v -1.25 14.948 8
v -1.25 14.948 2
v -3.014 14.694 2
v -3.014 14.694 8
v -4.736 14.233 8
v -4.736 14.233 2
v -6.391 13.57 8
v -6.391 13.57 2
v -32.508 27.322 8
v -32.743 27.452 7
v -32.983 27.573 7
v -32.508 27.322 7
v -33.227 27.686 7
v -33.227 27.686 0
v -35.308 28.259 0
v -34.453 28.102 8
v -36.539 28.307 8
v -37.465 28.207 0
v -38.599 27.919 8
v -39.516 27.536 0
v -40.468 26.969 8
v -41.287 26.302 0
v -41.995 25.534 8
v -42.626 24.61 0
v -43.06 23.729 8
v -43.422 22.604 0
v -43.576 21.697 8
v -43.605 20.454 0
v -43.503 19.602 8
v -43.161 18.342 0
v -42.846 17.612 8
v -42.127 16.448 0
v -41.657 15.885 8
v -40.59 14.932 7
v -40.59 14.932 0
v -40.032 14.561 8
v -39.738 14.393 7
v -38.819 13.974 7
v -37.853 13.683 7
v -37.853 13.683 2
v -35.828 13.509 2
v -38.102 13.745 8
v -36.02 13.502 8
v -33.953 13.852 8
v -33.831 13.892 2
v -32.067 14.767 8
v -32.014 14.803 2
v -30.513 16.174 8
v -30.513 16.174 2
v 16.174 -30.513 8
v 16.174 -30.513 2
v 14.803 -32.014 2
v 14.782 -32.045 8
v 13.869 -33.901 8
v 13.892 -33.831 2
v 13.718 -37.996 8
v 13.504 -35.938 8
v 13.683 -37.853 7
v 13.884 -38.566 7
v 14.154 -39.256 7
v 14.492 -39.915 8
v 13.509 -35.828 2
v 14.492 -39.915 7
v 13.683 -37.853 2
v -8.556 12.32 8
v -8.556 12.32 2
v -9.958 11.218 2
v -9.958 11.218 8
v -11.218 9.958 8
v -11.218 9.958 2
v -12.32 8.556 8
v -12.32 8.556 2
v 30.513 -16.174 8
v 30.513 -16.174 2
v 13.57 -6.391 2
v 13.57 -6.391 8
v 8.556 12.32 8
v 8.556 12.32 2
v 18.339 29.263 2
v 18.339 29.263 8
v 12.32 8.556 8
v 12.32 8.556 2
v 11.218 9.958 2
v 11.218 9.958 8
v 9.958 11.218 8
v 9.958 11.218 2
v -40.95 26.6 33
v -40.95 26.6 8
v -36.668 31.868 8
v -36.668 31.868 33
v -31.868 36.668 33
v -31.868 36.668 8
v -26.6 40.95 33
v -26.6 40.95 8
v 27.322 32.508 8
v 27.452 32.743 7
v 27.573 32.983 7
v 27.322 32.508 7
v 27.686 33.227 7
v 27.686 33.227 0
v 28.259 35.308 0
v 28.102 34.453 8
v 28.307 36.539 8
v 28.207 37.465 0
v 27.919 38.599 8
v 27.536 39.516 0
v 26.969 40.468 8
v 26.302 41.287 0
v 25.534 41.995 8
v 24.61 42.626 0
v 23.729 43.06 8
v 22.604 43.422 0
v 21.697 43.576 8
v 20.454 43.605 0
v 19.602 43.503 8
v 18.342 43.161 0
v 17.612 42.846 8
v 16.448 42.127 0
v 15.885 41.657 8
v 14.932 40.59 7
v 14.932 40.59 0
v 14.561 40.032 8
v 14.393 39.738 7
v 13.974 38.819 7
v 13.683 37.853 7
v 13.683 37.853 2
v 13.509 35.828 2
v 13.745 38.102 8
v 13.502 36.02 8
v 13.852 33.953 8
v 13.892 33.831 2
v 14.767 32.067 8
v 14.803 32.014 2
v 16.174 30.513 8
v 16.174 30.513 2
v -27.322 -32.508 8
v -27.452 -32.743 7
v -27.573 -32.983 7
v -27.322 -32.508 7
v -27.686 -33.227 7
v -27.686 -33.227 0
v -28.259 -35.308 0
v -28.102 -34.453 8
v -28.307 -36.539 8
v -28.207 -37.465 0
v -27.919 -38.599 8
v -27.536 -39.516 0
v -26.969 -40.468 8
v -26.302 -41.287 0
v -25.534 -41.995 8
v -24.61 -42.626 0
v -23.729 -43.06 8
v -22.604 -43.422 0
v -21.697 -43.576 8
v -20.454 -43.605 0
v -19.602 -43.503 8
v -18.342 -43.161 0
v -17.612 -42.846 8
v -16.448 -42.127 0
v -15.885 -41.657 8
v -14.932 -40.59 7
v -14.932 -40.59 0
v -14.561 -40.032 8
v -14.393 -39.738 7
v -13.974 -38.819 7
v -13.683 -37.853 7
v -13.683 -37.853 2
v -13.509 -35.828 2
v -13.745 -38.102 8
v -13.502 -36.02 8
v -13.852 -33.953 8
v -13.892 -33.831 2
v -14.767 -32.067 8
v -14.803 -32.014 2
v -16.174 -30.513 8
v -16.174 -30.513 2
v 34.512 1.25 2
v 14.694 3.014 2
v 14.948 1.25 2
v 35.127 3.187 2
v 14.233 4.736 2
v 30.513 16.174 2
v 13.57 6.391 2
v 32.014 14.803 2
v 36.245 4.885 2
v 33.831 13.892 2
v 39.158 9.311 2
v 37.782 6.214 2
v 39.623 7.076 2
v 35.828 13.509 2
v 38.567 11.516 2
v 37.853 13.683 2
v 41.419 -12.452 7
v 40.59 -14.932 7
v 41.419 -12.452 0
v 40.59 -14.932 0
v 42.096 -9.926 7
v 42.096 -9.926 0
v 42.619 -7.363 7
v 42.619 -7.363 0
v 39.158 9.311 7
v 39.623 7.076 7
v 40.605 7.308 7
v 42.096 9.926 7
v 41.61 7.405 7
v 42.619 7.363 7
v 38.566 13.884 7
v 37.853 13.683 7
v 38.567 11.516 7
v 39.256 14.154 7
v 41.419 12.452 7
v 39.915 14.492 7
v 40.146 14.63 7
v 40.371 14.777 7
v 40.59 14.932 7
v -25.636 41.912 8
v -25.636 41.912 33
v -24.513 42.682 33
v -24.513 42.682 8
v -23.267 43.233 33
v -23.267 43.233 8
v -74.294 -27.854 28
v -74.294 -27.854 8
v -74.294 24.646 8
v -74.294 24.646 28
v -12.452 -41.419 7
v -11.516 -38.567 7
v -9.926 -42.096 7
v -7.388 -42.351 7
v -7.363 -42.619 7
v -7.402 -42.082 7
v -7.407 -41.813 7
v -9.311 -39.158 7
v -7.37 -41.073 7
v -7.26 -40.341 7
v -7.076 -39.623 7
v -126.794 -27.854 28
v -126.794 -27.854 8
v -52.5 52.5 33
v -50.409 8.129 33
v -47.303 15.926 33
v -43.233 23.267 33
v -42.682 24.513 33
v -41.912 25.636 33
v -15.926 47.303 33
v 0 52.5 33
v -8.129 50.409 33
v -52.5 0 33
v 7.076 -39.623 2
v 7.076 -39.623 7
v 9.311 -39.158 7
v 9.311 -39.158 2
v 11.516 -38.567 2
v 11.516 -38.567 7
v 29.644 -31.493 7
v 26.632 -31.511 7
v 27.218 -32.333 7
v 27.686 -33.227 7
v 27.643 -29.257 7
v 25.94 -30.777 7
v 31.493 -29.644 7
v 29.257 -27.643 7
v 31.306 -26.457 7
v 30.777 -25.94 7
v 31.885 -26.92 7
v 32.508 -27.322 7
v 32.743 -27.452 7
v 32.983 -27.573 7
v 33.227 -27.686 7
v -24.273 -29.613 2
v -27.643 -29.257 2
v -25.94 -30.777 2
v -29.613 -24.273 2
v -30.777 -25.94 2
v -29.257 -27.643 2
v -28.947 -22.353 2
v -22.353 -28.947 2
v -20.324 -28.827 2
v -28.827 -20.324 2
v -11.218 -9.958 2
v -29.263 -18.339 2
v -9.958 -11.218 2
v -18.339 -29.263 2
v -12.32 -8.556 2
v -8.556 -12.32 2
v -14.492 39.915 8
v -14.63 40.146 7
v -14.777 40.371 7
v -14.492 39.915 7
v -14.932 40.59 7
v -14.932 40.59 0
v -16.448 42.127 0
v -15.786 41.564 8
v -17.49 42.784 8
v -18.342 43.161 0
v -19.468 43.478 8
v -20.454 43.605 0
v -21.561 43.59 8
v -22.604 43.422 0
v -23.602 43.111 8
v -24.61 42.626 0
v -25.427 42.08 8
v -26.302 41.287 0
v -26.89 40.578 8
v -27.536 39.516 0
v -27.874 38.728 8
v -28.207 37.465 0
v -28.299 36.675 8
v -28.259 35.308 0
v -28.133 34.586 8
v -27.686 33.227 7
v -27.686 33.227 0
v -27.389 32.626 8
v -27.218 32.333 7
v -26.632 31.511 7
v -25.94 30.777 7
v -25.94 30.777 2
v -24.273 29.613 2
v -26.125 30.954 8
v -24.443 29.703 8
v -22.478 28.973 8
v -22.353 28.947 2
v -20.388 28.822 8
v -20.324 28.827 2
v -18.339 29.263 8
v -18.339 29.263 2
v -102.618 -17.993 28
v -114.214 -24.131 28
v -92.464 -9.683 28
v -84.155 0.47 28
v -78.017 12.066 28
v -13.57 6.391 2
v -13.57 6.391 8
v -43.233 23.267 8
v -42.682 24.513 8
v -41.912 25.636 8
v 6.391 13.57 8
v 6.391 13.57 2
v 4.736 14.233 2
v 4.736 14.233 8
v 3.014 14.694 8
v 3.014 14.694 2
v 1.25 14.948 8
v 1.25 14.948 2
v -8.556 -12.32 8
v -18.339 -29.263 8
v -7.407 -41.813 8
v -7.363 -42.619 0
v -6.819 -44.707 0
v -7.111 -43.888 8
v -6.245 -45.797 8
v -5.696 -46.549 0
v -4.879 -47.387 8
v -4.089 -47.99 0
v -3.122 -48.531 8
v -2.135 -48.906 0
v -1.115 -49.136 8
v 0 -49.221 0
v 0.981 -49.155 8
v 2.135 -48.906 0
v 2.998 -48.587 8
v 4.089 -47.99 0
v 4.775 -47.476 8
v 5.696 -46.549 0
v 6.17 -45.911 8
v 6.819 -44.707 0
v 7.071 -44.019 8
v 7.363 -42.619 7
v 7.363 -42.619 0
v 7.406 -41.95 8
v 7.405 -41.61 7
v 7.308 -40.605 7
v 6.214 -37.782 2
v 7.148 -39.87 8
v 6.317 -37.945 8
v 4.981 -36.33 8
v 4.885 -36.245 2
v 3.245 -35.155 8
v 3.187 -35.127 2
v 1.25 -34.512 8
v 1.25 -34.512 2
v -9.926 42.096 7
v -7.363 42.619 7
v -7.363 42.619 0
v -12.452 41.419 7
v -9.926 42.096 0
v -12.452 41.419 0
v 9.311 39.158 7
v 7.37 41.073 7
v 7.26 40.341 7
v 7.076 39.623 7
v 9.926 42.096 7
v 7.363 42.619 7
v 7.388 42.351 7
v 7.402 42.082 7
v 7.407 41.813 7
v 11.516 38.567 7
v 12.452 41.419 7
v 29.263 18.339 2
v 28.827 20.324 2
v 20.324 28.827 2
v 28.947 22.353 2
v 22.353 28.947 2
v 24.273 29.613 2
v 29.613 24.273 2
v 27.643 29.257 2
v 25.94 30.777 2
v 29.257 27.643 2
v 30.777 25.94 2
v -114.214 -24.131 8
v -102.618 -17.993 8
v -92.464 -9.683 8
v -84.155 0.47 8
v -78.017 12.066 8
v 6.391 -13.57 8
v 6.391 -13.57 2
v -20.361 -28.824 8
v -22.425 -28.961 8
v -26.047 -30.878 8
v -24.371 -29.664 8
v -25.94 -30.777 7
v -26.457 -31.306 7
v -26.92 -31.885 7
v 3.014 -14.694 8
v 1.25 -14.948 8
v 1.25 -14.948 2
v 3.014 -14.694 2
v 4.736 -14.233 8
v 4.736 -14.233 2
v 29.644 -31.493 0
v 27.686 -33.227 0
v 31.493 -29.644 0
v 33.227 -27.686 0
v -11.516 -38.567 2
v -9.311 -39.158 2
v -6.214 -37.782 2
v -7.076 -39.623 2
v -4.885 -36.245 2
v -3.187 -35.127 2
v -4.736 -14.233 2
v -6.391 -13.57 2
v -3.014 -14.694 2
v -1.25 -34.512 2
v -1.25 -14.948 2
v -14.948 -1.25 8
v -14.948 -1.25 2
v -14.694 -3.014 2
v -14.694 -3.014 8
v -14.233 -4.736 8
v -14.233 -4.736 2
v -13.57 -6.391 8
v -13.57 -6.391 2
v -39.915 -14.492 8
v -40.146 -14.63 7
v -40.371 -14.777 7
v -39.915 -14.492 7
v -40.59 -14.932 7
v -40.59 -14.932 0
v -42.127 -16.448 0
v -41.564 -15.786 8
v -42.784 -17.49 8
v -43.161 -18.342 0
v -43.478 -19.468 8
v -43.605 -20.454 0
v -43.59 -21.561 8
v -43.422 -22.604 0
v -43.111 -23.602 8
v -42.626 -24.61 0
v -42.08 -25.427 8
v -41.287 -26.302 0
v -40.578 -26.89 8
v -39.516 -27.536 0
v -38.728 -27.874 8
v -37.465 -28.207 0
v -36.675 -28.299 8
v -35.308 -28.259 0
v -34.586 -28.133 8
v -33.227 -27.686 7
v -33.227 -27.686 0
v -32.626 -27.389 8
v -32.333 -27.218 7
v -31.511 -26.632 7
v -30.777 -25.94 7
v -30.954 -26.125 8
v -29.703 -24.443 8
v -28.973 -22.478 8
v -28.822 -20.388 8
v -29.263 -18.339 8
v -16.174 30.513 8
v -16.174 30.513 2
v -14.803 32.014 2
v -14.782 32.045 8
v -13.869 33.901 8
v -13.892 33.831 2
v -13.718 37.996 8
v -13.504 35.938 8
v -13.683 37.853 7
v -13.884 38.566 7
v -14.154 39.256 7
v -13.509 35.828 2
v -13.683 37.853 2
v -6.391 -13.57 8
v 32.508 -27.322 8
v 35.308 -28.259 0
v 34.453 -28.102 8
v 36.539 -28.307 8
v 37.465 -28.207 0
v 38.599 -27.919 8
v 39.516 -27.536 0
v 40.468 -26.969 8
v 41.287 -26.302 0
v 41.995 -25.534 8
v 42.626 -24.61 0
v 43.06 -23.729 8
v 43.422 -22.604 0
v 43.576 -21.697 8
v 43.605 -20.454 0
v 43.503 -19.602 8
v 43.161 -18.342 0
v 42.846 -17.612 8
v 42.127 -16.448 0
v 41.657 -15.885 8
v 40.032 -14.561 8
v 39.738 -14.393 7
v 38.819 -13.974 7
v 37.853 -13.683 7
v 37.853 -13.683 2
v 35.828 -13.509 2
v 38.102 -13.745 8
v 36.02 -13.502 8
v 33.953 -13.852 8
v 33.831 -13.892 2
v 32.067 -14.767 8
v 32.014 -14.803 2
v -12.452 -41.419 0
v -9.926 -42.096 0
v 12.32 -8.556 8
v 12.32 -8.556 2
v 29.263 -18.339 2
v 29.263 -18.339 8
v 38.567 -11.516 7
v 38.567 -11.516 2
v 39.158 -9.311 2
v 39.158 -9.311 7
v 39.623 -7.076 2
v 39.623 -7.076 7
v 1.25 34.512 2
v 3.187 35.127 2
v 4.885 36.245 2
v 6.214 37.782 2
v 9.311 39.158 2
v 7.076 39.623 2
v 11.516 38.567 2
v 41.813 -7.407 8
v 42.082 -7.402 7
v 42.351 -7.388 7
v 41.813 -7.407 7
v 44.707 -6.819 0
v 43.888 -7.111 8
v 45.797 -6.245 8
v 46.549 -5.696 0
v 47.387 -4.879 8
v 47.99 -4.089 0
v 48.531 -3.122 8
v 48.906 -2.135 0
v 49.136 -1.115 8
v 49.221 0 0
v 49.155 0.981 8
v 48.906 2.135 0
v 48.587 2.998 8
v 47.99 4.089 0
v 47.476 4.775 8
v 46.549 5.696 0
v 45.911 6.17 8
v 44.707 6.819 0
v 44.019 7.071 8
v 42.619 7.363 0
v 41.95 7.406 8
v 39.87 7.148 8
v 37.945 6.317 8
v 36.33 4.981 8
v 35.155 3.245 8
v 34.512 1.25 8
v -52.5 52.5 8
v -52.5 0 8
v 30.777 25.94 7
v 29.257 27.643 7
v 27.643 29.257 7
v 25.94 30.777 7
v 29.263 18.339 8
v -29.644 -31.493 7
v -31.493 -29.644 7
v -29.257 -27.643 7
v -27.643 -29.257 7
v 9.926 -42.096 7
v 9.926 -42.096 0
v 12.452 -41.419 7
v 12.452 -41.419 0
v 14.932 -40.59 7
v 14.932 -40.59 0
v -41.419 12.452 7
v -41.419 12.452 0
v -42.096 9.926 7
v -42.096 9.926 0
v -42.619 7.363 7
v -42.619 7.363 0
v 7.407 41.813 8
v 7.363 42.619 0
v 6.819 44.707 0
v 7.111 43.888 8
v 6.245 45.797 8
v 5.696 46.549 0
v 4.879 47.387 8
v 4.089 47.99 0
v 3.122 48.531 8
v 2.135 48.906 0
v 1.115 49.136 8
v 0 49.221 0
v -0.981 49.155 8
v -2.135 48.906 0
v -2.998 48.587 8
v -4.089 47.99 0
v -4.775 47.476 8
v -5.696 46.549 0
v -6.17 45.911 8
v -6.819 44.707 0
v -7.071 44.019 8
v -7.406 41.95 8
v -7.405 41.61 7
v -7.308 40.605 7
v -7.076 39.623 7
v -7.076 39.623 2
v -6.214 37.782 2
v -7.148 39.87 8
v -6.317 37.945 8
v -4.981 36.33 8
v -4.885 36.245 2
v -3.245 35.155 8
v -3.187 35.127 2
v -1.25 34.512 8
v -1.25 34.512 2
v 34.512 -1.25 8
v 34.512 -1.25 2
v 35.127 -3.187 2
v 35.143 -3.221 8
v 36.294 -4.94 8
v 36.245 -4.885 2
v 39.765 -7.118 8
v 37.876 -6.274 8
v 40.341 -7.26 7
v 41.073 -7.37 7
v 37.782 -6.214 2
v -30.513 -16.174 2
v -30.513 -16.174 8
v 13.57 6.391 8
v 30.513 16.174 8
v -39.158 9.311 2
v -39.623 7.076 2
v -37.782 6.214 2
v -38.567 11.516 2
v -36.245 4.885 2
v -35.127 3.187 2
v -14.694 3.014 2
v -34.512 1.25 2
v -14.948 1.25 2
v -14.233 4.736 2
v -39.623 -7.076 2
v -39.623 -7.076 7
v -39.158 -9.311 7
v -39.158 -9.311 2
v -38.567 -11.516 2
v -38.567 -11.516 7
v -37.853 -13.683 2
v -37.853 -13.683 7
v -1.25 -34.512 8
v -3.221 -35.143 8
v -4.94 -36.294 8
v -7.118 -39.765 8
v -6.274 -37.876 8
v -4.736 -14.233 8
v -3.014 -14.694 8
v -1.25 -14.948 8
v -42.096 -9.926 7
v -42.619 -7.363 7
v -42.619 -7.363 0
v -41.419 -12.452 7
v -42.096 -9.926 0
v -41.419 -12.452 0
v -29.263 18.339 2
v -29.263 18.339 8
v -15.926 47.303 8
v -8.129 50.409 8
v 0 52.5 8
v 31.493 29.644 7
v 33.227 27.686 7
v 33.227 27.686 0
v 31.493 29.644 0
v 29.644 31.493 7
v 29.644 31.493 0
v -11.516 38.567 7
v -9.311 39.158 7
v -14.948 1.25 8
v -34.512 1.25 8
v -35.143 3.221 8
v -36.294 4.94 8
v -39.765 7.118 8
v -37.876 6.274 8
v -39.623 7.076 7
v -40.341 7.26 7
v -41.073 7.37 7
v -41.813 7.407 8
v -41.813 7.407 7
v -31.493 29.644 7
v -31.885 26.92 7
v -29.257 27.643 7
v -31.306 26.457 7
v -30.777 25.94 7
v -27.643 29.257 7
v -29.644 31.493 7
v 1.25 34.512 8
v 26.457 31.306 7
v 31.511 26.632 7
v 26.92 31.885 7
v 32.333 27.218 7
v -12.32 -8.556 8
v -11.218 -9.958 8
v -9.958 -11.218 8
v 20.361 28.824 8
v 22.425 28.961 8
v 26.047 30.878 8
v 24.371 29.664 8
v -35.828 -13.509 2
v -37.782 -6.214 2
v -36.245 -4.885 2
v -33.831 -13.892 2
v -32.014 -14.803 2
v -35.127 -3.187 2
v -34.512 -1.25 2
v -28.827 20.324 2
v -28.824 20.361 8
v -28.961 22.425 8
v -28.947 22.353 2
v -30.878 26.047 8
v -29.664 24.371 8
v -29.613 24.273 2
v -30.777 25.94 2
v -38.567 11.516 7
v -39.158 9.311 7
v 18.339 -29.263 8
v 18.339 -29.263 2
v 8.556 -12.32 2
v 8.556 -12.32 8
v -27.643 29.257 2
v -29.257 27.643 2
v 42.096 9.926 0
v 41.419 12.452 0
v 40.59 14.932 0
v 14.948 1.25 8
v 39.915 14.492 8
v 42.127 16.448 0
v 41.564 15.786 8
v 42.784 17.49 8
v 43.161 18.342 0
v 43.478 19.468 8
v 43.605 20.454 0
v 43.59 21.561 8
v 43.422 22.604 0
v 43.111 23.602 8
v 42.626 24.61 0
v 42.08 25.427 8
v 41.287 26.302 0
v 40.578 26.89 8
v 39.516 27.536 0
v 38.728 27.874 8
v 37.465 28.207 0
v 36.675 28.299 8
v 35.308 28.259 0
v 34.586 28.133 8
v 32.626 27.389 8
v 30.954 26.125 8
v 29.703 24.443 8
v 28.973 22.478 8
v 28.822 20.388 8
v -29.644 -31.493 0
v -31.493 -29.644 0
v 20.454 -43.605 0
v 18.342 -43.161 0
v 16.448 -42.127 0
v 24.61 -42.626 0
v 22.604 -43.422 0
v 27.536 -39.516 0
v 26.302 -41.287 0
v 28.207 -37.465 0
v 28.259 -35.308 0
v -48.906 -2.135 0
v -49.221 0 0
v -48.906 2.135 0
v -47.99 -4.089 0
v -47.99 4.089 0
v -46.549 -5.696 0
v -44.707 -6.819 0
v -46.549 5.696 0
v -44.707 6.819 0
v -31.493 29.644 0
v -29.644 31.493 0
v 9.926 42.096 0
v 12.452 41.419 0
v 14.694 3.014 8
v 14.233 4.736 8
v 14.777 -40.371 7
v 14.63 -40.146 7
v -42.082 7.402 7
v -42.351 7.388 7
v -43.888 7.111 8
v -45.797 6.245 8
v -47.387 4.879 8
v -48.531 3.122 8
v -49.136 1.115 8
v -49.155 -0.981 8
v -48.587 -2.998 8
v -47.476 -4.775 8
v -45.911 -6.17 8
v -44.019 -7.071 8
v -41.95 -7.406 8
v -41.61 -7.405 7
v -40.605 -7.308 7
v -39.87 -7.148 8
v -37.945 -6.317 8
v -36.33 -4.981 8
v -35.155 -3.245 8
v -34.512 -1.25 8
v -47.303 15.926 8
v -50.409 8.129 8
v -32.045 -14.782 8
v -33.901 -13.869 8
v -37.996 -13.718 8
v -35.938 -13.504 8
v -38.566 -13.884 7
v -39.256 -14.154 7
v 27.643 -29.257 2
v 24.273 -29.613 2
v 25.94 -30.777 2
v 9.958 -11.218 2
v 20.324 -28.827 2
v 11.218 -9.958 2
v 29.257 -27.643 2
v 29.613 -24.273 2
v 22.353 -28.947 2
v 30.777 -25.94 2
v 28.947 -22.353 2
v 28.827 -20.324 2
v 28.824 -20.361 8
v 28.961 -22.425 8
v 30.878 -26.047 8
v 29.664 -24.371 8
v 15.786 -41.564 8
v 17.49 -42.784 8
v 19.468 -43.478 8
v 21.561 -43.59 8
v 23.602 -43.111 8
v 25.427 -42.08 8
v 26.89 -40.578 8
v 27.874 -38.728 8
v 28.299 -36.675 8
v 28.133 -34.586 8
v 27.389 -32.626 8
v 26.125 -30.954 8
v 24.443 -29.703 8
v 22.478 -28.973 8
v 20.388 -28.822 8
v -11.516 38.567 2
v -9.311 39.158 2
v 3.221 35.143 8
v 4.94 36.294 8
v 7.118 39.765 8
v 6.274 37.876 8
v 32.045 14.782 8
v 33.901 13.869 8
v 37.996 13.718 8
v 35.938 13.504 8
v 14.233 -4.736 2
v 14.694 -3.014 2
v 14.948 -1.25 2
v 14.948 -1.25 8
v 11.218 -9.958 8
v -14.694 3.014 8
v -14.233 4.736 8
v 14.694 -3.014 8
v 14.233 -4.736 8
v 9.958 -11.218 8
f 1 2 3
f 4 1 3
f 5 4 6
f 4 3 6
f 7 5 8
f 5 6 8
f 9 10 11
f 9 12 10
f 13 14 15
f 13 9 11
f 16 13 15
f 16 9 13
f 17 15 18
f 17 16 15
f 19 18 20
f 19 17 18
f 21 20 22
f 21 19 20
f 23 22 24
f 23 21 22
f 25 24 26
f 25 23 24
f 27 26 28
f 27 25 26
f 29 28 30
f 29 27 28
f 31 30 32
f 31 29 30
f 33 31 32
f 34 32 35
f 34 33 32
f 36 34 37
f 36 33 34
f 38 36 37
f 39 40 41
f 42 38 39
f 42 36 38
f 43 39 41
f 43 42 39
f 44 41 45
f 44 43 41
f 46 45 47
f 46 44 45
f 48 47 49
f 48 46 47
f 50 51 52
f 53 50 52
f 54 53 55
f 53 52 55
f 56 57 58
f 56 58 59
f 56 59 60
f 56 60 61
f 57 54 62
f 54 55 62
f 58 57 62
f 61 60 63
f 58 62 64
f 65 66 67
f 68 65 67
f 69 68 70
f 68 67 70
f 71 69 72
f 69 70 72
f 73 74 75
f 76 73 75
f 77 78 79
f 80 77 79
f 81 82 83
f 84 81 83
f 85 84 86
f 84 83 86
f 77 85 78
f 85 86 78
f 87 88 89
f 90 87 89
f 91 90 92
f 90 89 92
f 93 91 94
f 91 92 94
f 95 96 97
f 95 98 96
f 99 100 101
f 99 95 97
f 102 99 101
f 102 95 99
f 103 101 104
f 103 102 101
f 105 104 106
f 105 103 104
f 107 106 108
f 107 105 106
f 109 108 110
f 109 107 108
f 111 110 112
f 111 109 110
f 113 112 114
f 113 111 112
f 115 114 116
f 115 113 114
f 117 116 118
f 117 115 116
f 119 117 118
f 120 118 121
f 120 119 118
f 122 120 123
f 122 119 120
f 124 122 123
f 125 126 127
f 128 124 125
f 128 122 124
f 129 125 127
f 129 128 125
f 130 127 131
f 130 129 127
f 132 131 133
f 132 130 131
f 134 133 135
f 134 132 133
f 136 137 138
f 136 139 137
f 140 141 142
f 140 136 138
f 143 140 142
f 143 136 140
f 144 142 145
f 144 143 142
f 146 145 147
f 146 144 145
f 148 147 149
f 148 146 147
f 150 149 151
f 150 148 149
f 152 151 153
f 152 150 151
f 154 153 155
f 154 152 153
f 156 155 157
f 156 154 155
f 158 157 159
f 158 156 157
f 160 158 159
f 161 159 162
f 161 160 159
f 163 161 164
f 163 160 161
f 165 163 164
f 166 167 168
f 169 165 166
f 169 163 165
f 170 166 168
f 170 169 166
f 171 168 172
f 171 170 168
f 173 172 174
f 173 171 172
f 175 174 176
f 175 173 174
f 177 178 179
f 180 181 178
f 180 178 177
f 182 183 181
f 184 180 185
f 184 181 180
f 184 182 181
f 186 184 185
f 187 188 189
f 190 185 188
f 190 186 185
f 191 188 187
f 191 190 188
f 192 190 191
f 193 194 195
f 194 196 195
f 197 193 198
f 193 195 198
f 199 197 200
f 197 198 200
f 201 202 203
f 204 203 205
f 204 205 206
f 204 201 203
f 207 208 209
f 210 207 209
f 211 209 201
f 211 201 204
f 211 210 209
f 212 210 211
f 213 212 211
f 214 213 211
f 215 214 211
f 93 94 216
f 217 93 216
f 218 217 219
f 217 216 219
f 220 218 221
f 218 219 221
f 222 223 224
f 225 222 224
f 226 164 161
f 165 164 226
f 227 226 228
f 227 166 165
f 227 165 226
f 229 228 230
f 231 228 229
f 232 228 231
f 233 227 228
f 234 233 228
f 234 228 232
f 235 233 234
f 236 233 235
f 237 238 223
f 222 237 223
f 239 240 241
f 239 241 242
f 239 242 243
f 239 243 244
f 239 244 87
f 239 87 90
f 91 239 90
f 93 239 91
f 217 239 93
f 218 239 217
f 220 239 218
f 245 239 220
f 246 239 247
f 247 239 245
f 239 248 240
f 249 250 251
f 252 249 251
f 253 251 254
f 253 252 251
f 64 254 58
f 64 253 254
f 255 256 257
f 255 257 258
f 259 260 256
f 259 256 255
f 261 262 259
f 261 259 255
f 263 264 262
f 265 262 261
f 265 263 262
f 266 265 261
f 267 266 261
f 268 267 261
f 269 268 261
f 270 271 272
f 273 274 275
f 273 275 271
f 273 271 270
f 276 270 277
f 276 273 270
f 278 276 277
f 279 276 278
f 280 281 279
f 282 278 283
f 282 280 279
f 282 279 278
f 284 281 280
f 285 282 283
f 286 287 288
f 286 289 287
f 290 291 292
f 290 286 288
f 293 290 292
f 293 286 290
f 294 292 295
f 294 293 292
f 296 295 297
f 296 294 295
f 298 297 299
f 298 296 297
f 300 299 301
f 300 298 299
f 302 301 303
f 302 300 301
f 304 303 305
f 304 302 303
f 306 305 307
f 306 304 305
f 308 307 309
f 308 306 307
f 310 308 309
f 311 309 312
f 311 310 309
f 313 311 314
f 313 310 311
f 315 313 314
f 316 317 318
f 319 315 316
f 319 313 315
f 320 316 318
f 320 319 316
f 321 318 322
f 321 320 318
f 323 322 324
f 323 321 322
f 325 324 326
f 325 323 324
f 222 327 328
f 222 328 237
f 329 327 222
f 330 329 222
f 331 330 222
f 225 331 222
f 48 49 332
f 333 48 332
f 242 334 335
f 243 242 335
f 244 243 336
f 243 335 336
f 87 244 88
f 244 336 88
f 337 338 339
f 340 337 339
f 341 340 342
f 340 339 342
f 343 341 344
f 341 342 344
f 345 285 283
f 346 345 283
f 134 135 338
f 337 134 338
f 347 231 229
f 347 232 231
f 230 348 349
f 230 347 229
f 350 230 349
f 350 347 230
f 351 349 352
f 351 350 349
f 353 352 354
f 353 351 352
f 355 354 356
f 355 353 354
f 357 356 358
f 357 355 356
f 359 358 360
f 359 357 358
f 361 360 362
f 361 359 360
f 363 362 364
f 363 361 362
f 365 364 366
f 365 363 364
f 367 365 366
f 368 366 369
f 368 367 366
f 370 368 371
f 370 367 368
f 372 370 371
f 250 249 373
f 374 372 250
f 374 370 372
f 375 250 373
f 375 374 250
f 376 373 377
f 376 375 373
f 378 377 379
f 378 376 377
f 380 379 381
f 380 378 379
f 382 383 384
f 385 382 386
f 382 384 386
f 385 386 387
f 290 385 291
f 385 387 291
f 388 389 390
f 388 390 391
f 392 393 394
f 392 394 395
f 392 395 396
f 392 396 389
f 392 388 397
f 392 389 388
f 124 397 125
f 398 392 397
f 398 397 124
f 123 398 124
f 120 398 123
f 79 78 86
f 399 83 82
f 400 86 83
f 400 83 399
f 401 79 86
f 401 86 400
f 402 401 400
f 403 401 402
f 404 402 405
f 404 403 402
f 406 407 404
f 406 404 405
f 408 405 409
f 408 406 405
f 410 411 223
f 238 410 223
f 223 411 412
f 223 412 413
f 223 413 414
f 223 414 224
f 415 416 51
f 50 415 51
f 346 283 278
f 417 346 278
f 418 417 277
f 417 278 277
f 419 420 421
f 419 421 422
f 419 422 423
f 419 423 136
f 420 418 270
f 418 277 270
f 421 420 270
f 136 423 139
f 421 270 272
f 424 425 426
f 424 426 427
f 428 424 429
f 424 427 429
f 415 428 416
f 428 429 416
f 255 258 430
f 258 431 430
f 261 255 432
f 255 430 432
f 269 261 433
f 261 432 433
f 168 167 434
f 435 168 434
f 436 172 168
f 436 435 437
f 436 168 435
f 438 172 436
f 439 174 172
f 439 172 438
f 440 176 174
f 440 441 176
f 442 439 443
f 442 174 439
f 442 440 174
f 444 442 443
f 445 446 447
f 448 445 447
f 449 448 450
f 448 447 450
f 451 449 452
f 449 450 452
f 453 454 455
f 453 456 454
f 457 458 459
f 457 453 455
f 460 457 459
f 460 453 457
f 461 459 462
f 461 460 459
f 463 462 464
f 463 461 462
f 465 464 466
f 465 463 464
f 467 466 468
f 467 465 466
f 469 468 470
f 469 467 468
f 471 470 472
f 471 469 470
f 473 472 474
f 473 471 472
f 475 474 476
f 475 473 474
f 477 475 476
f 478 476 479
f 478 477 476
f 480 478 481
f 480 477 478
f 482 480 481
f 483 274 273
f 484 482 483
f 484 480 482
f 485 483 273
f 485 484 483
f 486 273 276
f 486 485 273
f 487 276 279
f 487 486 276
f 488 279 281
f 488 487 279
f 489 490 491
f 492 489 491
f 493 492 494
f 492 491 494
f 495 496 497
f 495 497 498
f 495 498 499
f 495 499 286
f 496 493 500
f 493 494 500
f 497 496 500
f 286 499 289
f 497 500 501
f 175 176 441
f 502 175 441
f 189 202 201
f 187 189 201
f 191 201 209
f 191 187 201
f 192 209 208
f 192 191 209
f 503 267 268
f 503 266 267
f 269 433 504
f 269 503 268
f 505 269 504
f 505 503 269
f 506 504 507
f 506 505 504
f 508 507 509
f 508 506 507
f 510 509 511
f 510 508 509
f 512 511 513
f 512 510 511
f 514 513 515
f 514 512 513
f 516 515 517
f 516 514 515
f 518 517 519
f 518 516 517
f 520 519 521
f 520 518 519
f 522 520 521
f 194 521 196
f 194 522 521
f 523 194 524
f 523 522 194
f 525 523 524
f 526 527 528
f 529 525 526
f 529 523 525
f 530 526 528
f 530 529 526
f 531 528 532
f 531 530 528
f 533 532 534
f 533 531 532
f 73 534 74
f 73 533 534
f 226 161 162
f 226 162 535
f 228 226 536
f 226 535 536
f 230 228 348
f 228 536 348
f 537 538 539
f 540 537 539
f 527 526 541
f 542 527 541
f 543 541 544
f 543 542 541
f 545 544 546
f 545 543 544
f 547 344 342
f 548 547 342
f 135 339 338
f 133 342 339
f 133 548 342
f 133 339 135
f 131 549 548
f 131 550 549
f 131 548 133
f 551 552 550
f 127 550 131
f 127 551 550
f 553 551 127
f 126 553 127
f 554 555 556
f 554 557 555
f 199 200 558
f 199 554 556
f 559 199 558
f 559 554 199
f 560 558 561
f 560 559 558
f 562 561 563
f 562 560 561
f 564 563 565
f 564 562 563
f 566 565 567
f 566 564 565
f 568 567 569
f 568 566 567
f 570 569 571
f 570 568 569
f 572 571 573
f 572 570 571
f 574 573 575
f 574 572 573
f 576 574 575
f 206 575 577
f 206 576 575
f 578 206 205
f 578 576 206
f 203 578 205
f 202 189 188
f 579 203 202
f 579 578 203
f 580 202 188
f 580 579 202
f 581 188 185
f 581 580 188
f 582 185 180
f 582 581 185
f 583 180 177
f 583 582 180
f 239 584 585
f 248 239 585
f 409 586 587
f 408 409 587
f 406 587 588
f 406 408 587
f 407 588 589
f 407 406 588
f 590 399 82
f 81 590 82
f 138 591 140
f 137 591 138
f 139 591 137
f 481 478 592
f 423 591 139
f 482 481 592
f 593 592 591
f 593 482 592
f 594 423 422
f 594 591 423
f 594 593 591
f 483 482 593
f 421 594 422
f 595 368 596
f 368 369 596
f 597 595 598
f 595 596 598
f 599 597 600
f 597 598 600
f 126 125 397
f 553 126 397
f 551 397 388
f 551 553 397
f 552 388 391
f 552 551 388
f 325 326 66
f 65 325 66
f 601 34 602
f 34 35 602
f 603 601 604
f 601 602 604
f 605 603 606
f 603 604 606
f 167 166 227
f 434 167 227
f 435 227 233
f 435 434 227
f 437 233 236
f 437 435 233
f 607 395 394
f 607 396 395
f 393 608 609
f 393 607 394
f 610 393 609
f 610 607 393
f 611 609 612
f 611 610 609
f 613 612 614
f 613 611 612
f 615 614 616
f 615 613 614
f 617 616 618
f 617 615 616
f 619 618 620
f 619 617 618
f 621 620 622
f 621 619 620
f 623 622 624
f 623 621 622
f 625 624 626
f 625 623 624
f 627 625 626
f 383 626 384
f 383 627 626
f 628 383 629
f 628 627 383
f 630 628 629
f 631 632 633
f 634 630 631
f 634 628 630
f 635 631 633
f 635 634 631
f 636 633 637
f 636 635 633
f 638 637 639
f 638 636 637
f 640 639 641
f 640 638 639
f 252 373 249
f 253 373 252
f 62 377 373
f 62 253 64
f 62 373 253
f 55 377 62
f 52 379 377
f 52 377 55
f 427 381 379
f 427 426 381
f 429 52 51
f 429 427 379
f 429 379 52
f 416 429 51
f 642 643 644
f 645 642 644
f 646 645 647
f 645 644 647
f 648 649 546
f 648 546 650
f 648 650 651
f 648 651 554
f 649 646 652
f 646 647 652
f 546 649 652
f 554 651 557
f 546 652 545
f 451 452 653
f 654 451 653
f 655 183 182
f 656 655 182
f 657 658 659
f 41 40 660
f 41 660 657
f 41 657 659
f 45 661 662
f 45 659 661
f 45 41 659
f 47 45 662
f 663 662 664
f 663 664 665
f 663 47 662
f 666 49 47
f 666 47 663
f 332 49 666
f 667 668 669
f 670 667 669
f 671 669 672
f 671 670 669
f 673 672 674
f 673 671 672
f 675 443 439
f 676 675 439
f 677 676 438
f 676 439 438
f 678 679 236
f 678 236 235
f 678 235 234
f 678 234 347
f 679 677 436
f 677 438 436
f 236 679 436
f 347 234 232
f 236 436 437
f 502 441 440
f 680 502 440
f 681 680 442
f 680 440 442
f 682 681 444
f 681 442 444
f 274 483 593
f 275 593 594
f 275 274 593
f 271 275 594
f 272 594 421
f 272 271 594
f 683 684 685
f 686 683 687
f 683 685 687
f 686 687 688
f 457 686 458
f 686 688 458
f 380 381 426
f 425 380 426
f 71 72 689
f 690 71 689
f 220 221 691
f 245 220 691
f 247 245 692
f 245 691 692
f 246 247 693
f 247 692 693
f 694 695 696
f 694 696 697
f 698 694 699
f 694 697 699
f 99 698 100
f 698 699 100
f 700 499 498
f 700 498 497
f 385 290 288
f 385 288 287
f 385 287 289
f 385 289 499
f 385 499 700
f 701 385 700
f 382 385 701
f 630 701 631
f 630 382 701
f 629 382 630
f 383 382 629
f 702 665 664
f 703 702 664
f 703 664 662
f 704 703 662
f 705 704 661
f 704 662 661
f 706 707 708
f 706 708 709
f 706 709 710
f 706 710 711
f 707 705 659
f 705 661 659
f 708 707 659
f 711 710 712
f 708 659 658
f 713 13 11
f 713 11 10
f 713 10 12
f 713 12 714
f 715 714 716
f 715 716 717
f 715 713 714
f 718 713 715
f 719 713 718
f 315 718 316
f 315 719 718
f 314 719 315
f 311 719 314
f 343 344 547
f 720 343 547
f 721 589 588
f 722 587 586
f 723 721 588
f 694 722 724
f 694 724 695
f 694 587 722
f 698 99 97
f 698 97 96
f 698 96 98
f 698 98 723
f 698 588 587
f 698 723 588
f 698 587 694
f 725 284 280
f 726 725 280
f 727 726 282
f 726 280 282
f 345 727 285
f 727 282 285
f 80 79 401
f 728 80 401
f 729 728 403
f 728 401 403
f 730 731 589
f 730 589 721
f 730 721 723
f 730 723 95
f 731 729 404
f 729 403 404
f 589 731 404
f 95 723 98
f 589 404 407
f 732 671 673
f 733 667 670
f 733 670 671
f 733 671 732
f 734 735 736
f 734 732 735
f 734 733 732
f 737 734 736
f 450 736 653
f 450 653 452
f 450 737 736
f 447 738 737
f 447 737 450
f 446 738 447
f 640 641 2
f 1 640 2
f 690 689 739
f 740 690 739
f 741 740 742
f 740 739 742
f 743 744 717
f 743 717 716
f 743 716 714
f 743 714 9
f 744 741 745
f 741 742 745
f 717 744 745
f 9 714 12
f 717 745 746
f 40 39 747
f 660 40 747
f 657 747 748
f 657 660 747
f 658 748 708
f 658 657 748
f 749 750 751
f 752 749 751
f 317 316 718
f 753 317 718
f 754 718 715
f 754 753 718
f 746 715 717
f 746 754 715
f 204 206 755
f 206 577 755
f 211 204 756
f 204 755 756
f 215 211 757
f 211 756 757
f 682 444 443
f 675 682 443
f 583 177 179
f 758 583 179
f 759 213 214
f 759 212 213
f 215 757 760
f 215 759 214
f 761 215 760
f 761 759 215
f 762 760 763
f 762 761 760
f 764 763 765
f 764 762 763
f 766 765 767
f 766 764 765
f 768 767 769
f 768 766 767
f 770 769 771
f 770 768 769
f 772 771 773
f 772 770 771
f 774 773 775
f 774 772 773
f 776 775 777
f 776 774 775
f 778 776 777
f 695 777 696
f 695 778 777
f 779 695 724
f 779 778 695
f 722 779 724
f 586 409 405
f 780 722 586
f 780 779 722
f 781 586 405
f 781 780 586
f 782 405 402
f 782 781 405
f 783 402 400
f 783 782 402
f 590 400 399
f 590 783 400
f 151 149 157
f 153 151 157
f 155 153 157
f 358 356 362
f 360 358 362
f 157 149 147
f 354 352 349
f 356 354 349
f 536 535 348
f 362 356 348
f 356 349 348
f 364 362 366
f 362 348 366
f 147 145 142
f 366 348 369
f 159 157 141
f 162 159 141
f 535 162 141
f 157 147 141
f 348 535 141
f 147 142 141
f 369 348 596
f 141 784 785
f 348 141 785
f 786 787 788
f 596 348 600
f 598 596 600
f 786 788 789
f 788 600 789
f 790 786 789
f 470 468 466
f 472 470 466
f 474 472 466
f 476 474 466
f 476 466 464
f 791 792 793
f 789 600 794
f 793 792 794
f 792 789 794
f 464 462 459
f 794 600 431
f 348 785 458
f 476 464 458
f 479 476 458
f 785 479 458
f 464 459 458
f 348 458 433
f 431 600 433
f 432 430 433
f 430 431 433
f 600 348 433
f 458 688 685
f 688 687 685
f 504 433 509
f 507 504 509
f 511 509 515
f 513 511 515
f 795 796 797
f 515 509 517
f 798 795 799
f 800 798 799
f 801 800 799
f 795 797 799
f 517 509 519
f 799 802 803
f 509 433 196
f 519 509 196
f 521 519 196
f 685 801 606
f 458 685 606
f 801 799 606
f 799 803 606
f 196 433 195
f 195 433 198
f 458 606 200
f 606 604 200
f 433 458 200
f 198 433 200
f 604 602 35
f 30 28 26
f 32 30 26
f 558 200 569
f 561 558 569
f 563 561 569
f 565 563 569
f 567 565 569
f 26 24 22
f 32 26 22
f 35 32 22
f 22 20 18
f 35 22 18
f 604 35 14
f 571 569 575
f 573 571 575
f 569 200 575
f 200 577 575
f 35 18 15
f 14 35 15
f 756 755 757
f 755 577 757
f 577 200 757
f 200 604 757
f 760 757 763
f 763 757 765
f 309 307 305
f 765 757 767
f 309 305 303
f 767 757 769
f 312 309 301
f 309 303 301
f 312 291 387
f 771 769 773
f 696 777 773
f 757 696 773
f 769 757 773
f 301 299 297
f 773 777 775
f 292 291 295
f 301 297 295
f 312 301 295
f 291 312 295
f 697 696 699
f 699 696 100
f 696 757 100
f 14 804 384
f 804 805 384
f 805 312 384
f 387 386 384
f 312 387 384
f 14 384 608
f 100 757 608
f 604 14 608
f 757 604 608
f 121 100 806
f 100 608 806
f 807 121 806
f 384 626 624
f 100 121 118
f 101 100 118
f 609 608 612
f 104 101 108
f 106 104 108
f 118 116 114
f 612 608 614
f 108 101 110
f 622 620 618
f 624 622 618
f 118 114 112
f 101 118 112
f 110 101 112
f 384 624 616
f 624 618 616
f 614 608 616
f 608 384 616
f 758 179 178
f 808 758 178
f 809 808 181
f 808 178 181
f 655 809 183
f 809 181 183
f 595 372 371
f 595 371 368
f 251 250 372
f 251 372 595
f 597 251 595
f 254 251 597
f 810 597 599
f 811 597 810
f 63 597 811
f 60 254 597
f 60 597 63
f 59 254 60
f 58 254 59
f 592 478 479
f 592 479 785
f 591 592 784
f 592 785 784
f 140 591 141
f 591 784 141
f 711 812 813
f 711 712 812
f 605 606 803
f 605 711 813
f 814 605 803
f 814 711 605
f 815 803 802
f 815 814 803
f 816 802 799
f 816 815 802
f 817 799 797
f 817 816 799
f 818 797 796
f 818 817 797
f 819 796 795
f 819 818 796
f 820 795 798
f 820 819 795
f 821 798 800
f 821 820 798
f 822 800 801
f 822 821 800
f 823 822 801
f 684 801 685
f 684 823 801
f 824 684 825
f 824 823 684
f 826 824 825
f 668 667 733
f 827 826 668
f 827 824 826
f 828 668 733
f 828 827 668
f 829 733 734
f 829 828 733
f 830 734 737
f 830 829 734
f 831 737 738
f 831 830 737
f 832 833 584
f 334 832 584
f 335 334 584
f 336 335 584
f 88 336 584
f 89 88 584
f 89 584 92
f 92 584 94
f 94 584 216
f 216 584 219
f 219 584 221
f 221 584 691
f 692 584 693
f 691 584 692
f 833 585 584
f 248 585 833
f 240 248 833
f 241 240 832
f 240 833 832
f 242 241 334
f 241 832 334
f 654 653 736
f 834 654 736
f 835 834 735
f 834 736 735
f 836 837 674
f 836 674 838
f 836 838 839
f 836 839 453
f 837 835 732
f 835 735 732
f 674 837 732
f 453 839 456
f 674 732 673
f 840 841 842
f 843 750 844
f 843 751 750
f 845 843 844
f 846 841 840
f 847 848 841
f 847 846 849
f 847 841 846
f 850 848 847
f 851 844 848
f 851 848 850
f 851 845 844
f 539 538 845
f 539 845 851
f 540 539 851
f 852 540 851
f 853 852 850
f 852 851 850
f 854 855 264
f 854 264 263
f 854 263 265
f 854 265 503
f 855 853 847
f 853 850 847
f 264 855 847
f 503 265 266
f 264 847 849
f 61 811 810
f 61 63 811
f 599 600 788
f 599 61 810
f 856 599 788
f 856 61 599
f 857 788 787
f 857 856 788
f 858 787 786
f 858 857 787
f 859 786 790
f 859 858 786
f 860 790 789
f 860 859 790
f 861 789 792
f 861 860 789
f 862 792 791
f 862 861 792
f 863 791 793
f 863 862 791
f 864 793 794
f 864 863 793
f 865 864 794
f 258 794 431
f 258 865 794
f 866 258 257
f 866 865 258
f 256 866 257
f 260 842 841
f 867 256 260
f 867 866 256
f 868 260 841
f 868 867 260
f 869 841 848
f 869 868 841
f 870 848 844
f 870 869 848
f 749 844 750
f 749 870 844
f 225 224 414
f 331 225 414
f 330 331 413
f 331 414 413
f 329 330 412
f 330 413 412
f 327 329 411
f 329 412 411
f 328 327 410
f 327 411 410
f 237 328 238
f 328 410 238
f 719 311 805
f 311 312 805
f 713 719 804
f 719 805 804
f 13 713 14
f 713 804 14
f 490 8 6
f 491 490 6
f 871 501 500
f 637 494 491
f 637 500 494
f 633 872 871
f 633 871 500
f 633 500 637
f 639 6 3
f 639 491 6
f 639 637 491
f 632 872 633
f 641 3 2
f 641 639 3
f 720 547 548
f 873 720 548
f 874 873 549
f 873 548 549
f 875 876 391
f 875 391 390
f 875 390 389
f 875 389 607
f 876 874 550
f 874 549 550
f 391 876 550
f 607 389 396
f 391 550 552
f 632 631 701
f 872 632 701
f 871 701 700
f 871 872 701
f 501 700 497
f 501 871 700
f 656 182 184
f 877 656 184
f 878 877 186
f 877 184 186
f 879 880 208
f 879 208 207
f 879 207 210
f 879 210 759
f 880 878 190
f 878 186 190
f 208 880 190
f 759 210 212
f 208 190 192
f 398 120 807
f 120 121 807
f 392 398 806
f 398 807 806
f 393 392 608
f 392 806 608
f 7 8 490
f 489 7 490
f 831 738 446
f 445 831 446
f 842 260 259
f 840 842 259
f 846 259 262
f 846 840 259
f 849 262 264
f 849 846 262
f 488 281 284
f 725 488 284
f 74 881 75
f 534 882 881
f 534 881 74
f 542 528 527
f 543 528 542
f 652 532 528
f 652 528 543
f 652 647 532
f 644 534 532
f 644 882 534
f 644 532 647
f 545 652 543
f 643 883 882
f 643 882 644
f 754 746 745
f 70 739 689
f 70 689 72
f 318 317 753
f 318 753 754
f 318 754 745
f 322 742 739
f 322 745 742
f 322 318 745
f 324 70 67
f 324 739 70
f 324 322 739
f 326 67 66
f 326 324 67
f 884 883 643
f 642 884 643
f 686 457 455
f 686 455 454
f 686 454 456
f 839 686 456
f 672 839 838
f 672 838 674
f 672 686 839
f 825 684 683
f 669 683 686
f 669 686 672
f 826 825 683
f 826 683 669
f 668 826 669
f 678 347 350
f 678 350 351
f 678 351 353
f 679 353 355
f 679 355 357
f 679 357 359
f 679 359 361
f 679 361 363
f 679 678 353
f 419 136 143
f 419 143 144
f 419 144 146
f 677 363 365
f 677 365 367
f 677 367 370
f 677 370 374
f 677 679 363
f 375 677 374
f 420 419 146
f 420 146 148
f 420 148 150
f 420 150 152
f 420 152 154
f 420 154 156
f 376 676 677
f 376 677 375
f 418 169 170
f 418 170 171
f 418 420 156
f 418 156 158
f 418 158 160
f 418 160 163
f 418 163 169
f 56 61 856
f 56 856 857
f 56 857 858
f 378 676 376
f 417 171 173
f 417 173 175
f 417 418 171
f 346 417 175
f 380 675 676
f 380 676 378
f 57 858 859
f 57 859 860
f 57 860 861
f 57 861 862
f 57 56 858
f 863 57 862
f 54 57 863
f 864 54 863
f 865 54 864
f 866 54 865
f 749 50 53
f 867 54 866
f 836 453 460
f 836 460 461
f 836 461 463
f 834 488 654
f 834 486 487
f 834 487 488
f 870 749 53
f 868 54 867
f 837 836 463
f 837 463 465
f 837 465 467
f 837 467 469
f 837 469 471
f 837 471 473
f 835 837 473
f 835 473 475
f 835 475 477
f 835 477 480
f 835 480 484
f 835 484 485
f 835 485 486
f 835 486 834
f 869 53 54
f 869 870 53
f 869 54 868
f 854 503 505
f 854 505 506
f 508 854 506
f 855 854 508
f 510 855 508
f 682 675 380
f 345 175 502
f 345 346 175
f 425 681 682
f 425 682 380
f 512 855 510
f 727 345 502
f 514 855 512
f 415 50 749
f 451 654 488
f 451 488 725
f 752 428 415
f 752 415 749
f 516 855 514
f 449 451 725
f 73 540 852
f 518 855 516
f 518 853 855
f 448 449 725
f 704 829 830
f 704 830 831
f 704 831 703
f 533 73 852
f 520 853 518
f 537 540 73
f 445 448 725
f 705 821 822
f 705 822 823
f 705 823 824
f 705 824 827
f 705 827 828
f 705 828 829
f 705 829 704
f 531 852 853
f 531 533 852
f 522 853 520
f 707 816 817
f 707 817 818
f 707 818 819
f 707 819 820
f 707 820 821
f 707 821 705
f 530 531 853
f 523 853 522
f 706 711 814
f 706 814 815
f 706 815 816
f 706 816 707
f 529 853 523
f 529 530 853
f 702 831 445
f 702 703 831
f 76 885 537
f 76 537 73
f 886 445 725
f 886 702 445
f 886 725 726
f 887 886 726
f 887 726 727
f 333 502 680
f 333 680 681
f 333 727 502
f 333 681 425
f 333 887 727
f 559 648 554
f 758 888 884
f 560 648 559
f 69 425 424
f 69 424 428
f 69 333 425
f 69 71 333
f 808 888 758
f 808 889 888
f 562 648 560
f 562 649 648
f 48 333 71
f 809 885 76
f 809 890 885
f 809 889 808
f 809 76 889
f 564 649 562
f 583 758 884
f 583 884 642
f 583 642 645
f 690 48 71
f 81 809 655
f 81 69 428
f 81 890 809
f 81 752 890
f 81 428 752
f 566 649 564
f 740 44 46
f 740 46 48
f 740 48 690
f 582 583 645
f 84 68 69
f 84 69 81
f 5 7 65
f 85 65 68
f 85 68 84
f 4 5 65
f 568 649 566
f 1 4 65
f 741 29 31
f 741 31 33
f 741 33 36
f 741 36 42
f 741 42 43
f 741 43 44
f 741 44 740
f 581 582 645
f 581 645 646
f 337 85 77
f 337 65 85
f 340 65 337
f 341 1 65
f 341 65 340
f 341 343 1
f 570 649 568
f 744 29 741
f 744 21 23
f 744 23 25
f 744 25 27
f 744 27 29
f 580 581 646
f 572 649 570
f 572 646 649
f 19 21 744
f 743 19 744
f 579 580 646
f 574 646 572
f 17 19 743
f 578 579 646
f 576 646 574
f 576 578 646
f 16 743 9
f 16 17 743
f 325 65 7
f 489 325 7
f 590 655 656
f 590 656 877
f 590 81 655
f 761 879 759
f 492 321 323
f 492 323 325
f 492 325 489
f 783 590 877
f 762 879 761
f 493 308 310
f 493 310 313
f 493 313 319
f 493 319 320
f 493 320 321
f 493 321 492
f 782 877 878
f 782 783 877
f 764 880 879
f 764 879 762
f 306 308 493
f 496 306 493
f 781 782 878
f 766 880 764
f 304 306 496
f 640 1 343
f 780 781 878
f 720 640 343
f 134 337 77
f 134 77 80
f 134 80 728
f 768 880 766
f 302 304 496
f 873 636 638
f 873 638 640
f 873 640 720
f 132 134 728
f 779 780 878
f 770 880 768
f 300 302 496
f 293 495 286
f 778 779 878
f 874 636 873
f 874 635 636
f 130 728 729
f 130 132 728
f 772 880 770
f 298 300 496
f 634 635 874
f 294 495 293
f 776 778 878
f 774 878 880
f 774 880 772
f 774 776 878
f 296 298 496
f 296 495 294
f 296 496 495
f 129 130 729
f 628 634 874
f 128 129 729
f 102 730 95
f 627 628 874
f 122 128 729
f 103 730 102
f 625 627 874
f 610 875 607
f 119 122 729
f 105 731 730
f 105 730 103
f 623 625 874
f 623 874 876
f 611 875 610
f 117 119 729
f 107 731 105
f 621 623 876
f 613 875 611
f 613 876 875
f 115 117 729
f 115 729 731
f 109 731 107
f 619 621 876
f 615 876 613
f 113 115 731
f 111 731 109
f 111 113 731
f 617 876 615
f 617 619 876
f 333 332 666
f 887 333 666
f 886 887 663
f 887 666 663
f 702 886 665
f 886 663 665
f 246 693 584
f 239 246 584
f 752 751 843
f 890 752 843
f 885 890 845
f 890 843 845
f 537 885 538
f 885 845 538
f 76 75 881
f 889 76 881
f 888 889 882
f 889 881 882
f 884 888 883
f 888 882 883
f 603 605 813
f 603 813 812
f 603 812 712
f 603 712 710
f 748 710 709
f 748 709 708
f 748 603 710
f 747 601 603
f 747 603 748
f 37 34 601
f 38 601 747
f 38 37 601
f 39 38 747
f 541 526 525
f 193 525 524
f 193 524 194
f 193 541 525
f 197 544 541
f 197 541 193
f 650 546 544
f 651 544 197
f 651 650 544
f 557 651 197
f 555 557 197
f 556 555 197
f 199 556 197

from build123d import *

# Parameters (mm, degrees)
F0_R          = 40.25
F1_DEPTH      = 2
F0_R_2        = 43.25
F2_DEPTH      = 7
F4_DEPTH      = 6
F4_DEPTH_BACK = 2
F5_COUNT      = 12
F8_DEPTH      = 25
F9_DEPTH      = 20


with BuildPart() as f1:
    # F0 (on Top) → F1 (new body)
    with BuildSketch(Plane.XY):
        Circle(F0_R)
    extrude(amount=F1_DEPTH)

    # F0 (on Top) → F2 (join)
    with BuildSketch(Plane.XY):
        Circle(F0_R_2)
        Circle(F0_R, mode=Mode.SUBTRACT)
    extrude(amount=F2_DEPTH)

    # F3 (on face) → F4 (join, two sides)
    with BuildSketch(Plane.XY.offset(2)) as f4_sk:
        with BuildLine():
            ThreePointArc((-1.25, 14.9478259289), (-10.1550480058, -11.0397010829), (15, 0))
            ThreePointArc((15, 0), (11.0397010829, 10.1550480058), (1.25, 14.9478259289))
            Line((1.25, 14.9478259289), (-1.25, 14.9478259289))
        make_face()
        with BuildLine():
            Line((-1.25, 14.9478259289), (1.25, 14.9478259289))
            ThreePointArc((1.25, 14.9478259289), (0, 15), (-1.25, 14.9478259289))
        make_face()
        with BuildLine():
            ThreePointArc((-1.25, 14.9478259289), (0, 15), (1.25, 14.9478259289))
            Line((1.25, 14.9478259289), (1.25, 34.5122436197))
            ThreePointArc((1.25, 34.5122436197), (0, 34.4060120647), (-1.25, 34.5122436197))
            Line((-1.25, 34.5122436197), (-1.25, 14.9478259289))
        make_face()
        with BuildLine():
            Line((1.25, 35.6158574725), (1.25, 34.5122436197))
            ThreePointArc((1.25, 34.5122436197), (5.6624976292, 37.0379177359), (7.4073336461, 41.8133457108))
            ThreePointArc((7.4073336461, 41.8133457108), (-4.7754279749, 47.47584334), (-1.25, 34.5122436197))
            Line((-1.25, 34.5122436197), (-1.25, 35.6158574725))
            Line((-1.25, 35.6158574725), (1.25, 35.6158574725))
        make_face()
        with BuildLine():
            ThreePointArc((-1.25, 34.5122436197), (0, 34.4060120647), (1.25, 34.5122436197))
            Line((1.25, 34.5122436197), (1.25, 35.6158574725))
            Line((1.25, 35.6158574725), (-1.25, 35.6158574725))
            Line((-1.25, 35.6158574725), (-1.25, 34.5122436197))
        make_face()
    extrude(amount=F4_DEPTH)
    extrude(f4_sk.sketch, amount=-F4_DEPTH_BACK)


with BuildPart() as f5_1:
    # F5: instance of F1
    add(f1.part.rotate(Axis((0, 0, 8), (0, 0, 1)), 1 * 360 / F5_COUNT))


with BuildPart() as f5_2:
    # F5: instance of F1
    add(f1.part.rotate(Axis((0, 0, 8), (0, 0, 1)), 2 * 360 / F5_COUNT))


with BuildPart() as f5_3:
    # F5: instance of F1
    add(f1.part.rotate(Axis((0, 0, 8), (0, 0, 1)), 3 * 360 / F5_COUNT))


with BuildPart() as f5_4:
    # F5: instance of F1
    add(f1.part.rotate(Axis((0, 0, 8), (0, 0, 1)), 4 * 360 / F5_COUNT))


with BuildPart() as f5_5:
    # F5: instance of F1
    add(f1.part.rotate(Axis((0, 0, 8), (0, 0, 1)), 5 * 360 / F5_COUNT))


with BuildPart() as f5_6:
    # F5: instance of F1
    add(f1.part.rotate(Axis((0, 0, 8), (0, 0, 1)), 6 * 360 / F5_COUNT))


with BuildPart() as f5_7:
    # F5: instance of F1
    add(f1.part.rotate(Axis((0, 0, 8), (0, 0, 1)), 7 * 360 / F5_COUNT))


with BuildPart() as f5_8:
    # F5: instance of F1
    add(f1.part.rotate(Axis((0, 0, 8), (0, 0, 1)), 8 * 360 / F5_COUNT))


with BuildPart() as f5_9:
    # F5: instance of F1
    add(f1.part.rotate(Axis((0, 0, 8), (0, 0, 1)), 9 * 360 / F5_COUNT))


with BuildPart() as f5_10:
    # F5: instance of F1
    add(f1.part.rotate(Axis((0, 0, 8), (0, 0, 1)), 10 * 360 / F5_COUNT))


with BuildPart() as f5_11:
    # F5: instance of F1
    add(f1.part.rotate(Axis((0, 0, 8), (0, 0, 1)), 11 * 360 / F5_COUNT))


with BuildPart() as f1_1:
    add(f1.part)

    # F6: union F5_4, F5_5, F5_6, F5_7, F5_9, F5_8, F5_10, F5_11, F5_3, F5_2, F5_1
    add(f5_4.part)
    add(f5_5.part)
    add(f5_6.part)
    add(f5_7.part)
    add(f5_9.part)
    add(f5_8.part)
    add(f5_10.part)
    add(f5_11.part)
    add(f5_3.part)
    add(f5_2.part)
    add(f5_1.part)


with BuildPart() as f8:
    # F7 (on face) → F8 (new body)
    with BuildSketch(Plane.XY.offset(8)):
        with BuildLine():
            Line((0, 52.5), (-52.5, 52.5))
            Line((-52.5, 52.5), (-52.5, 0))
            ThreePointArc((-52.5, 0), (-48.9797558206, 12.0770455366), (-43.2325997049, 23.2671011466))
            ThreePointArc((-43.2325997049, 23.2671011466), (-42.3229324795, 25.0921240978), (-40.9501056978, 26.5999536175))
            ThreePointArc((-40.9501056978, 26.5999536175), (-34.3297431889, 34.3297431889), (-26.5999536175, 40.9501056978))
            ThreePointArc((-26.5999536175, 40.9501056978), (-25.0921240978, 42.3229324795), (-23.2671011466, 43.2325997049))
            ThreePointArc((-23.2671011466, 43.2325997049), (-12.0770455366, 48.9797558206), (0, 52.5))
        make_face()
    extrude(amount=F8_DEPTH)


with BuildPart() as f9:
    # F7 (on face) → F9 (new body)
    with BuildSketch(Plane.XY.offset(8)):
        with BuildLine():
            Line((-74.2941743135, -27.8537180275), (-74.2941743135, 24.6462819725))
            ThreePointArc((-74.2941743135, 24.6462819725), (-92.4643966502, -9.6834956908), (-126.7941743135, -27.8537180275))
            Line((-126.7941743135, -27.8537180275), (-74.2941743135, -27.8537180275))
        make_face()
    extrude(amount=F9_DEPTH)


solid = Compound([f1_1.part, f8.part, f9.part])
